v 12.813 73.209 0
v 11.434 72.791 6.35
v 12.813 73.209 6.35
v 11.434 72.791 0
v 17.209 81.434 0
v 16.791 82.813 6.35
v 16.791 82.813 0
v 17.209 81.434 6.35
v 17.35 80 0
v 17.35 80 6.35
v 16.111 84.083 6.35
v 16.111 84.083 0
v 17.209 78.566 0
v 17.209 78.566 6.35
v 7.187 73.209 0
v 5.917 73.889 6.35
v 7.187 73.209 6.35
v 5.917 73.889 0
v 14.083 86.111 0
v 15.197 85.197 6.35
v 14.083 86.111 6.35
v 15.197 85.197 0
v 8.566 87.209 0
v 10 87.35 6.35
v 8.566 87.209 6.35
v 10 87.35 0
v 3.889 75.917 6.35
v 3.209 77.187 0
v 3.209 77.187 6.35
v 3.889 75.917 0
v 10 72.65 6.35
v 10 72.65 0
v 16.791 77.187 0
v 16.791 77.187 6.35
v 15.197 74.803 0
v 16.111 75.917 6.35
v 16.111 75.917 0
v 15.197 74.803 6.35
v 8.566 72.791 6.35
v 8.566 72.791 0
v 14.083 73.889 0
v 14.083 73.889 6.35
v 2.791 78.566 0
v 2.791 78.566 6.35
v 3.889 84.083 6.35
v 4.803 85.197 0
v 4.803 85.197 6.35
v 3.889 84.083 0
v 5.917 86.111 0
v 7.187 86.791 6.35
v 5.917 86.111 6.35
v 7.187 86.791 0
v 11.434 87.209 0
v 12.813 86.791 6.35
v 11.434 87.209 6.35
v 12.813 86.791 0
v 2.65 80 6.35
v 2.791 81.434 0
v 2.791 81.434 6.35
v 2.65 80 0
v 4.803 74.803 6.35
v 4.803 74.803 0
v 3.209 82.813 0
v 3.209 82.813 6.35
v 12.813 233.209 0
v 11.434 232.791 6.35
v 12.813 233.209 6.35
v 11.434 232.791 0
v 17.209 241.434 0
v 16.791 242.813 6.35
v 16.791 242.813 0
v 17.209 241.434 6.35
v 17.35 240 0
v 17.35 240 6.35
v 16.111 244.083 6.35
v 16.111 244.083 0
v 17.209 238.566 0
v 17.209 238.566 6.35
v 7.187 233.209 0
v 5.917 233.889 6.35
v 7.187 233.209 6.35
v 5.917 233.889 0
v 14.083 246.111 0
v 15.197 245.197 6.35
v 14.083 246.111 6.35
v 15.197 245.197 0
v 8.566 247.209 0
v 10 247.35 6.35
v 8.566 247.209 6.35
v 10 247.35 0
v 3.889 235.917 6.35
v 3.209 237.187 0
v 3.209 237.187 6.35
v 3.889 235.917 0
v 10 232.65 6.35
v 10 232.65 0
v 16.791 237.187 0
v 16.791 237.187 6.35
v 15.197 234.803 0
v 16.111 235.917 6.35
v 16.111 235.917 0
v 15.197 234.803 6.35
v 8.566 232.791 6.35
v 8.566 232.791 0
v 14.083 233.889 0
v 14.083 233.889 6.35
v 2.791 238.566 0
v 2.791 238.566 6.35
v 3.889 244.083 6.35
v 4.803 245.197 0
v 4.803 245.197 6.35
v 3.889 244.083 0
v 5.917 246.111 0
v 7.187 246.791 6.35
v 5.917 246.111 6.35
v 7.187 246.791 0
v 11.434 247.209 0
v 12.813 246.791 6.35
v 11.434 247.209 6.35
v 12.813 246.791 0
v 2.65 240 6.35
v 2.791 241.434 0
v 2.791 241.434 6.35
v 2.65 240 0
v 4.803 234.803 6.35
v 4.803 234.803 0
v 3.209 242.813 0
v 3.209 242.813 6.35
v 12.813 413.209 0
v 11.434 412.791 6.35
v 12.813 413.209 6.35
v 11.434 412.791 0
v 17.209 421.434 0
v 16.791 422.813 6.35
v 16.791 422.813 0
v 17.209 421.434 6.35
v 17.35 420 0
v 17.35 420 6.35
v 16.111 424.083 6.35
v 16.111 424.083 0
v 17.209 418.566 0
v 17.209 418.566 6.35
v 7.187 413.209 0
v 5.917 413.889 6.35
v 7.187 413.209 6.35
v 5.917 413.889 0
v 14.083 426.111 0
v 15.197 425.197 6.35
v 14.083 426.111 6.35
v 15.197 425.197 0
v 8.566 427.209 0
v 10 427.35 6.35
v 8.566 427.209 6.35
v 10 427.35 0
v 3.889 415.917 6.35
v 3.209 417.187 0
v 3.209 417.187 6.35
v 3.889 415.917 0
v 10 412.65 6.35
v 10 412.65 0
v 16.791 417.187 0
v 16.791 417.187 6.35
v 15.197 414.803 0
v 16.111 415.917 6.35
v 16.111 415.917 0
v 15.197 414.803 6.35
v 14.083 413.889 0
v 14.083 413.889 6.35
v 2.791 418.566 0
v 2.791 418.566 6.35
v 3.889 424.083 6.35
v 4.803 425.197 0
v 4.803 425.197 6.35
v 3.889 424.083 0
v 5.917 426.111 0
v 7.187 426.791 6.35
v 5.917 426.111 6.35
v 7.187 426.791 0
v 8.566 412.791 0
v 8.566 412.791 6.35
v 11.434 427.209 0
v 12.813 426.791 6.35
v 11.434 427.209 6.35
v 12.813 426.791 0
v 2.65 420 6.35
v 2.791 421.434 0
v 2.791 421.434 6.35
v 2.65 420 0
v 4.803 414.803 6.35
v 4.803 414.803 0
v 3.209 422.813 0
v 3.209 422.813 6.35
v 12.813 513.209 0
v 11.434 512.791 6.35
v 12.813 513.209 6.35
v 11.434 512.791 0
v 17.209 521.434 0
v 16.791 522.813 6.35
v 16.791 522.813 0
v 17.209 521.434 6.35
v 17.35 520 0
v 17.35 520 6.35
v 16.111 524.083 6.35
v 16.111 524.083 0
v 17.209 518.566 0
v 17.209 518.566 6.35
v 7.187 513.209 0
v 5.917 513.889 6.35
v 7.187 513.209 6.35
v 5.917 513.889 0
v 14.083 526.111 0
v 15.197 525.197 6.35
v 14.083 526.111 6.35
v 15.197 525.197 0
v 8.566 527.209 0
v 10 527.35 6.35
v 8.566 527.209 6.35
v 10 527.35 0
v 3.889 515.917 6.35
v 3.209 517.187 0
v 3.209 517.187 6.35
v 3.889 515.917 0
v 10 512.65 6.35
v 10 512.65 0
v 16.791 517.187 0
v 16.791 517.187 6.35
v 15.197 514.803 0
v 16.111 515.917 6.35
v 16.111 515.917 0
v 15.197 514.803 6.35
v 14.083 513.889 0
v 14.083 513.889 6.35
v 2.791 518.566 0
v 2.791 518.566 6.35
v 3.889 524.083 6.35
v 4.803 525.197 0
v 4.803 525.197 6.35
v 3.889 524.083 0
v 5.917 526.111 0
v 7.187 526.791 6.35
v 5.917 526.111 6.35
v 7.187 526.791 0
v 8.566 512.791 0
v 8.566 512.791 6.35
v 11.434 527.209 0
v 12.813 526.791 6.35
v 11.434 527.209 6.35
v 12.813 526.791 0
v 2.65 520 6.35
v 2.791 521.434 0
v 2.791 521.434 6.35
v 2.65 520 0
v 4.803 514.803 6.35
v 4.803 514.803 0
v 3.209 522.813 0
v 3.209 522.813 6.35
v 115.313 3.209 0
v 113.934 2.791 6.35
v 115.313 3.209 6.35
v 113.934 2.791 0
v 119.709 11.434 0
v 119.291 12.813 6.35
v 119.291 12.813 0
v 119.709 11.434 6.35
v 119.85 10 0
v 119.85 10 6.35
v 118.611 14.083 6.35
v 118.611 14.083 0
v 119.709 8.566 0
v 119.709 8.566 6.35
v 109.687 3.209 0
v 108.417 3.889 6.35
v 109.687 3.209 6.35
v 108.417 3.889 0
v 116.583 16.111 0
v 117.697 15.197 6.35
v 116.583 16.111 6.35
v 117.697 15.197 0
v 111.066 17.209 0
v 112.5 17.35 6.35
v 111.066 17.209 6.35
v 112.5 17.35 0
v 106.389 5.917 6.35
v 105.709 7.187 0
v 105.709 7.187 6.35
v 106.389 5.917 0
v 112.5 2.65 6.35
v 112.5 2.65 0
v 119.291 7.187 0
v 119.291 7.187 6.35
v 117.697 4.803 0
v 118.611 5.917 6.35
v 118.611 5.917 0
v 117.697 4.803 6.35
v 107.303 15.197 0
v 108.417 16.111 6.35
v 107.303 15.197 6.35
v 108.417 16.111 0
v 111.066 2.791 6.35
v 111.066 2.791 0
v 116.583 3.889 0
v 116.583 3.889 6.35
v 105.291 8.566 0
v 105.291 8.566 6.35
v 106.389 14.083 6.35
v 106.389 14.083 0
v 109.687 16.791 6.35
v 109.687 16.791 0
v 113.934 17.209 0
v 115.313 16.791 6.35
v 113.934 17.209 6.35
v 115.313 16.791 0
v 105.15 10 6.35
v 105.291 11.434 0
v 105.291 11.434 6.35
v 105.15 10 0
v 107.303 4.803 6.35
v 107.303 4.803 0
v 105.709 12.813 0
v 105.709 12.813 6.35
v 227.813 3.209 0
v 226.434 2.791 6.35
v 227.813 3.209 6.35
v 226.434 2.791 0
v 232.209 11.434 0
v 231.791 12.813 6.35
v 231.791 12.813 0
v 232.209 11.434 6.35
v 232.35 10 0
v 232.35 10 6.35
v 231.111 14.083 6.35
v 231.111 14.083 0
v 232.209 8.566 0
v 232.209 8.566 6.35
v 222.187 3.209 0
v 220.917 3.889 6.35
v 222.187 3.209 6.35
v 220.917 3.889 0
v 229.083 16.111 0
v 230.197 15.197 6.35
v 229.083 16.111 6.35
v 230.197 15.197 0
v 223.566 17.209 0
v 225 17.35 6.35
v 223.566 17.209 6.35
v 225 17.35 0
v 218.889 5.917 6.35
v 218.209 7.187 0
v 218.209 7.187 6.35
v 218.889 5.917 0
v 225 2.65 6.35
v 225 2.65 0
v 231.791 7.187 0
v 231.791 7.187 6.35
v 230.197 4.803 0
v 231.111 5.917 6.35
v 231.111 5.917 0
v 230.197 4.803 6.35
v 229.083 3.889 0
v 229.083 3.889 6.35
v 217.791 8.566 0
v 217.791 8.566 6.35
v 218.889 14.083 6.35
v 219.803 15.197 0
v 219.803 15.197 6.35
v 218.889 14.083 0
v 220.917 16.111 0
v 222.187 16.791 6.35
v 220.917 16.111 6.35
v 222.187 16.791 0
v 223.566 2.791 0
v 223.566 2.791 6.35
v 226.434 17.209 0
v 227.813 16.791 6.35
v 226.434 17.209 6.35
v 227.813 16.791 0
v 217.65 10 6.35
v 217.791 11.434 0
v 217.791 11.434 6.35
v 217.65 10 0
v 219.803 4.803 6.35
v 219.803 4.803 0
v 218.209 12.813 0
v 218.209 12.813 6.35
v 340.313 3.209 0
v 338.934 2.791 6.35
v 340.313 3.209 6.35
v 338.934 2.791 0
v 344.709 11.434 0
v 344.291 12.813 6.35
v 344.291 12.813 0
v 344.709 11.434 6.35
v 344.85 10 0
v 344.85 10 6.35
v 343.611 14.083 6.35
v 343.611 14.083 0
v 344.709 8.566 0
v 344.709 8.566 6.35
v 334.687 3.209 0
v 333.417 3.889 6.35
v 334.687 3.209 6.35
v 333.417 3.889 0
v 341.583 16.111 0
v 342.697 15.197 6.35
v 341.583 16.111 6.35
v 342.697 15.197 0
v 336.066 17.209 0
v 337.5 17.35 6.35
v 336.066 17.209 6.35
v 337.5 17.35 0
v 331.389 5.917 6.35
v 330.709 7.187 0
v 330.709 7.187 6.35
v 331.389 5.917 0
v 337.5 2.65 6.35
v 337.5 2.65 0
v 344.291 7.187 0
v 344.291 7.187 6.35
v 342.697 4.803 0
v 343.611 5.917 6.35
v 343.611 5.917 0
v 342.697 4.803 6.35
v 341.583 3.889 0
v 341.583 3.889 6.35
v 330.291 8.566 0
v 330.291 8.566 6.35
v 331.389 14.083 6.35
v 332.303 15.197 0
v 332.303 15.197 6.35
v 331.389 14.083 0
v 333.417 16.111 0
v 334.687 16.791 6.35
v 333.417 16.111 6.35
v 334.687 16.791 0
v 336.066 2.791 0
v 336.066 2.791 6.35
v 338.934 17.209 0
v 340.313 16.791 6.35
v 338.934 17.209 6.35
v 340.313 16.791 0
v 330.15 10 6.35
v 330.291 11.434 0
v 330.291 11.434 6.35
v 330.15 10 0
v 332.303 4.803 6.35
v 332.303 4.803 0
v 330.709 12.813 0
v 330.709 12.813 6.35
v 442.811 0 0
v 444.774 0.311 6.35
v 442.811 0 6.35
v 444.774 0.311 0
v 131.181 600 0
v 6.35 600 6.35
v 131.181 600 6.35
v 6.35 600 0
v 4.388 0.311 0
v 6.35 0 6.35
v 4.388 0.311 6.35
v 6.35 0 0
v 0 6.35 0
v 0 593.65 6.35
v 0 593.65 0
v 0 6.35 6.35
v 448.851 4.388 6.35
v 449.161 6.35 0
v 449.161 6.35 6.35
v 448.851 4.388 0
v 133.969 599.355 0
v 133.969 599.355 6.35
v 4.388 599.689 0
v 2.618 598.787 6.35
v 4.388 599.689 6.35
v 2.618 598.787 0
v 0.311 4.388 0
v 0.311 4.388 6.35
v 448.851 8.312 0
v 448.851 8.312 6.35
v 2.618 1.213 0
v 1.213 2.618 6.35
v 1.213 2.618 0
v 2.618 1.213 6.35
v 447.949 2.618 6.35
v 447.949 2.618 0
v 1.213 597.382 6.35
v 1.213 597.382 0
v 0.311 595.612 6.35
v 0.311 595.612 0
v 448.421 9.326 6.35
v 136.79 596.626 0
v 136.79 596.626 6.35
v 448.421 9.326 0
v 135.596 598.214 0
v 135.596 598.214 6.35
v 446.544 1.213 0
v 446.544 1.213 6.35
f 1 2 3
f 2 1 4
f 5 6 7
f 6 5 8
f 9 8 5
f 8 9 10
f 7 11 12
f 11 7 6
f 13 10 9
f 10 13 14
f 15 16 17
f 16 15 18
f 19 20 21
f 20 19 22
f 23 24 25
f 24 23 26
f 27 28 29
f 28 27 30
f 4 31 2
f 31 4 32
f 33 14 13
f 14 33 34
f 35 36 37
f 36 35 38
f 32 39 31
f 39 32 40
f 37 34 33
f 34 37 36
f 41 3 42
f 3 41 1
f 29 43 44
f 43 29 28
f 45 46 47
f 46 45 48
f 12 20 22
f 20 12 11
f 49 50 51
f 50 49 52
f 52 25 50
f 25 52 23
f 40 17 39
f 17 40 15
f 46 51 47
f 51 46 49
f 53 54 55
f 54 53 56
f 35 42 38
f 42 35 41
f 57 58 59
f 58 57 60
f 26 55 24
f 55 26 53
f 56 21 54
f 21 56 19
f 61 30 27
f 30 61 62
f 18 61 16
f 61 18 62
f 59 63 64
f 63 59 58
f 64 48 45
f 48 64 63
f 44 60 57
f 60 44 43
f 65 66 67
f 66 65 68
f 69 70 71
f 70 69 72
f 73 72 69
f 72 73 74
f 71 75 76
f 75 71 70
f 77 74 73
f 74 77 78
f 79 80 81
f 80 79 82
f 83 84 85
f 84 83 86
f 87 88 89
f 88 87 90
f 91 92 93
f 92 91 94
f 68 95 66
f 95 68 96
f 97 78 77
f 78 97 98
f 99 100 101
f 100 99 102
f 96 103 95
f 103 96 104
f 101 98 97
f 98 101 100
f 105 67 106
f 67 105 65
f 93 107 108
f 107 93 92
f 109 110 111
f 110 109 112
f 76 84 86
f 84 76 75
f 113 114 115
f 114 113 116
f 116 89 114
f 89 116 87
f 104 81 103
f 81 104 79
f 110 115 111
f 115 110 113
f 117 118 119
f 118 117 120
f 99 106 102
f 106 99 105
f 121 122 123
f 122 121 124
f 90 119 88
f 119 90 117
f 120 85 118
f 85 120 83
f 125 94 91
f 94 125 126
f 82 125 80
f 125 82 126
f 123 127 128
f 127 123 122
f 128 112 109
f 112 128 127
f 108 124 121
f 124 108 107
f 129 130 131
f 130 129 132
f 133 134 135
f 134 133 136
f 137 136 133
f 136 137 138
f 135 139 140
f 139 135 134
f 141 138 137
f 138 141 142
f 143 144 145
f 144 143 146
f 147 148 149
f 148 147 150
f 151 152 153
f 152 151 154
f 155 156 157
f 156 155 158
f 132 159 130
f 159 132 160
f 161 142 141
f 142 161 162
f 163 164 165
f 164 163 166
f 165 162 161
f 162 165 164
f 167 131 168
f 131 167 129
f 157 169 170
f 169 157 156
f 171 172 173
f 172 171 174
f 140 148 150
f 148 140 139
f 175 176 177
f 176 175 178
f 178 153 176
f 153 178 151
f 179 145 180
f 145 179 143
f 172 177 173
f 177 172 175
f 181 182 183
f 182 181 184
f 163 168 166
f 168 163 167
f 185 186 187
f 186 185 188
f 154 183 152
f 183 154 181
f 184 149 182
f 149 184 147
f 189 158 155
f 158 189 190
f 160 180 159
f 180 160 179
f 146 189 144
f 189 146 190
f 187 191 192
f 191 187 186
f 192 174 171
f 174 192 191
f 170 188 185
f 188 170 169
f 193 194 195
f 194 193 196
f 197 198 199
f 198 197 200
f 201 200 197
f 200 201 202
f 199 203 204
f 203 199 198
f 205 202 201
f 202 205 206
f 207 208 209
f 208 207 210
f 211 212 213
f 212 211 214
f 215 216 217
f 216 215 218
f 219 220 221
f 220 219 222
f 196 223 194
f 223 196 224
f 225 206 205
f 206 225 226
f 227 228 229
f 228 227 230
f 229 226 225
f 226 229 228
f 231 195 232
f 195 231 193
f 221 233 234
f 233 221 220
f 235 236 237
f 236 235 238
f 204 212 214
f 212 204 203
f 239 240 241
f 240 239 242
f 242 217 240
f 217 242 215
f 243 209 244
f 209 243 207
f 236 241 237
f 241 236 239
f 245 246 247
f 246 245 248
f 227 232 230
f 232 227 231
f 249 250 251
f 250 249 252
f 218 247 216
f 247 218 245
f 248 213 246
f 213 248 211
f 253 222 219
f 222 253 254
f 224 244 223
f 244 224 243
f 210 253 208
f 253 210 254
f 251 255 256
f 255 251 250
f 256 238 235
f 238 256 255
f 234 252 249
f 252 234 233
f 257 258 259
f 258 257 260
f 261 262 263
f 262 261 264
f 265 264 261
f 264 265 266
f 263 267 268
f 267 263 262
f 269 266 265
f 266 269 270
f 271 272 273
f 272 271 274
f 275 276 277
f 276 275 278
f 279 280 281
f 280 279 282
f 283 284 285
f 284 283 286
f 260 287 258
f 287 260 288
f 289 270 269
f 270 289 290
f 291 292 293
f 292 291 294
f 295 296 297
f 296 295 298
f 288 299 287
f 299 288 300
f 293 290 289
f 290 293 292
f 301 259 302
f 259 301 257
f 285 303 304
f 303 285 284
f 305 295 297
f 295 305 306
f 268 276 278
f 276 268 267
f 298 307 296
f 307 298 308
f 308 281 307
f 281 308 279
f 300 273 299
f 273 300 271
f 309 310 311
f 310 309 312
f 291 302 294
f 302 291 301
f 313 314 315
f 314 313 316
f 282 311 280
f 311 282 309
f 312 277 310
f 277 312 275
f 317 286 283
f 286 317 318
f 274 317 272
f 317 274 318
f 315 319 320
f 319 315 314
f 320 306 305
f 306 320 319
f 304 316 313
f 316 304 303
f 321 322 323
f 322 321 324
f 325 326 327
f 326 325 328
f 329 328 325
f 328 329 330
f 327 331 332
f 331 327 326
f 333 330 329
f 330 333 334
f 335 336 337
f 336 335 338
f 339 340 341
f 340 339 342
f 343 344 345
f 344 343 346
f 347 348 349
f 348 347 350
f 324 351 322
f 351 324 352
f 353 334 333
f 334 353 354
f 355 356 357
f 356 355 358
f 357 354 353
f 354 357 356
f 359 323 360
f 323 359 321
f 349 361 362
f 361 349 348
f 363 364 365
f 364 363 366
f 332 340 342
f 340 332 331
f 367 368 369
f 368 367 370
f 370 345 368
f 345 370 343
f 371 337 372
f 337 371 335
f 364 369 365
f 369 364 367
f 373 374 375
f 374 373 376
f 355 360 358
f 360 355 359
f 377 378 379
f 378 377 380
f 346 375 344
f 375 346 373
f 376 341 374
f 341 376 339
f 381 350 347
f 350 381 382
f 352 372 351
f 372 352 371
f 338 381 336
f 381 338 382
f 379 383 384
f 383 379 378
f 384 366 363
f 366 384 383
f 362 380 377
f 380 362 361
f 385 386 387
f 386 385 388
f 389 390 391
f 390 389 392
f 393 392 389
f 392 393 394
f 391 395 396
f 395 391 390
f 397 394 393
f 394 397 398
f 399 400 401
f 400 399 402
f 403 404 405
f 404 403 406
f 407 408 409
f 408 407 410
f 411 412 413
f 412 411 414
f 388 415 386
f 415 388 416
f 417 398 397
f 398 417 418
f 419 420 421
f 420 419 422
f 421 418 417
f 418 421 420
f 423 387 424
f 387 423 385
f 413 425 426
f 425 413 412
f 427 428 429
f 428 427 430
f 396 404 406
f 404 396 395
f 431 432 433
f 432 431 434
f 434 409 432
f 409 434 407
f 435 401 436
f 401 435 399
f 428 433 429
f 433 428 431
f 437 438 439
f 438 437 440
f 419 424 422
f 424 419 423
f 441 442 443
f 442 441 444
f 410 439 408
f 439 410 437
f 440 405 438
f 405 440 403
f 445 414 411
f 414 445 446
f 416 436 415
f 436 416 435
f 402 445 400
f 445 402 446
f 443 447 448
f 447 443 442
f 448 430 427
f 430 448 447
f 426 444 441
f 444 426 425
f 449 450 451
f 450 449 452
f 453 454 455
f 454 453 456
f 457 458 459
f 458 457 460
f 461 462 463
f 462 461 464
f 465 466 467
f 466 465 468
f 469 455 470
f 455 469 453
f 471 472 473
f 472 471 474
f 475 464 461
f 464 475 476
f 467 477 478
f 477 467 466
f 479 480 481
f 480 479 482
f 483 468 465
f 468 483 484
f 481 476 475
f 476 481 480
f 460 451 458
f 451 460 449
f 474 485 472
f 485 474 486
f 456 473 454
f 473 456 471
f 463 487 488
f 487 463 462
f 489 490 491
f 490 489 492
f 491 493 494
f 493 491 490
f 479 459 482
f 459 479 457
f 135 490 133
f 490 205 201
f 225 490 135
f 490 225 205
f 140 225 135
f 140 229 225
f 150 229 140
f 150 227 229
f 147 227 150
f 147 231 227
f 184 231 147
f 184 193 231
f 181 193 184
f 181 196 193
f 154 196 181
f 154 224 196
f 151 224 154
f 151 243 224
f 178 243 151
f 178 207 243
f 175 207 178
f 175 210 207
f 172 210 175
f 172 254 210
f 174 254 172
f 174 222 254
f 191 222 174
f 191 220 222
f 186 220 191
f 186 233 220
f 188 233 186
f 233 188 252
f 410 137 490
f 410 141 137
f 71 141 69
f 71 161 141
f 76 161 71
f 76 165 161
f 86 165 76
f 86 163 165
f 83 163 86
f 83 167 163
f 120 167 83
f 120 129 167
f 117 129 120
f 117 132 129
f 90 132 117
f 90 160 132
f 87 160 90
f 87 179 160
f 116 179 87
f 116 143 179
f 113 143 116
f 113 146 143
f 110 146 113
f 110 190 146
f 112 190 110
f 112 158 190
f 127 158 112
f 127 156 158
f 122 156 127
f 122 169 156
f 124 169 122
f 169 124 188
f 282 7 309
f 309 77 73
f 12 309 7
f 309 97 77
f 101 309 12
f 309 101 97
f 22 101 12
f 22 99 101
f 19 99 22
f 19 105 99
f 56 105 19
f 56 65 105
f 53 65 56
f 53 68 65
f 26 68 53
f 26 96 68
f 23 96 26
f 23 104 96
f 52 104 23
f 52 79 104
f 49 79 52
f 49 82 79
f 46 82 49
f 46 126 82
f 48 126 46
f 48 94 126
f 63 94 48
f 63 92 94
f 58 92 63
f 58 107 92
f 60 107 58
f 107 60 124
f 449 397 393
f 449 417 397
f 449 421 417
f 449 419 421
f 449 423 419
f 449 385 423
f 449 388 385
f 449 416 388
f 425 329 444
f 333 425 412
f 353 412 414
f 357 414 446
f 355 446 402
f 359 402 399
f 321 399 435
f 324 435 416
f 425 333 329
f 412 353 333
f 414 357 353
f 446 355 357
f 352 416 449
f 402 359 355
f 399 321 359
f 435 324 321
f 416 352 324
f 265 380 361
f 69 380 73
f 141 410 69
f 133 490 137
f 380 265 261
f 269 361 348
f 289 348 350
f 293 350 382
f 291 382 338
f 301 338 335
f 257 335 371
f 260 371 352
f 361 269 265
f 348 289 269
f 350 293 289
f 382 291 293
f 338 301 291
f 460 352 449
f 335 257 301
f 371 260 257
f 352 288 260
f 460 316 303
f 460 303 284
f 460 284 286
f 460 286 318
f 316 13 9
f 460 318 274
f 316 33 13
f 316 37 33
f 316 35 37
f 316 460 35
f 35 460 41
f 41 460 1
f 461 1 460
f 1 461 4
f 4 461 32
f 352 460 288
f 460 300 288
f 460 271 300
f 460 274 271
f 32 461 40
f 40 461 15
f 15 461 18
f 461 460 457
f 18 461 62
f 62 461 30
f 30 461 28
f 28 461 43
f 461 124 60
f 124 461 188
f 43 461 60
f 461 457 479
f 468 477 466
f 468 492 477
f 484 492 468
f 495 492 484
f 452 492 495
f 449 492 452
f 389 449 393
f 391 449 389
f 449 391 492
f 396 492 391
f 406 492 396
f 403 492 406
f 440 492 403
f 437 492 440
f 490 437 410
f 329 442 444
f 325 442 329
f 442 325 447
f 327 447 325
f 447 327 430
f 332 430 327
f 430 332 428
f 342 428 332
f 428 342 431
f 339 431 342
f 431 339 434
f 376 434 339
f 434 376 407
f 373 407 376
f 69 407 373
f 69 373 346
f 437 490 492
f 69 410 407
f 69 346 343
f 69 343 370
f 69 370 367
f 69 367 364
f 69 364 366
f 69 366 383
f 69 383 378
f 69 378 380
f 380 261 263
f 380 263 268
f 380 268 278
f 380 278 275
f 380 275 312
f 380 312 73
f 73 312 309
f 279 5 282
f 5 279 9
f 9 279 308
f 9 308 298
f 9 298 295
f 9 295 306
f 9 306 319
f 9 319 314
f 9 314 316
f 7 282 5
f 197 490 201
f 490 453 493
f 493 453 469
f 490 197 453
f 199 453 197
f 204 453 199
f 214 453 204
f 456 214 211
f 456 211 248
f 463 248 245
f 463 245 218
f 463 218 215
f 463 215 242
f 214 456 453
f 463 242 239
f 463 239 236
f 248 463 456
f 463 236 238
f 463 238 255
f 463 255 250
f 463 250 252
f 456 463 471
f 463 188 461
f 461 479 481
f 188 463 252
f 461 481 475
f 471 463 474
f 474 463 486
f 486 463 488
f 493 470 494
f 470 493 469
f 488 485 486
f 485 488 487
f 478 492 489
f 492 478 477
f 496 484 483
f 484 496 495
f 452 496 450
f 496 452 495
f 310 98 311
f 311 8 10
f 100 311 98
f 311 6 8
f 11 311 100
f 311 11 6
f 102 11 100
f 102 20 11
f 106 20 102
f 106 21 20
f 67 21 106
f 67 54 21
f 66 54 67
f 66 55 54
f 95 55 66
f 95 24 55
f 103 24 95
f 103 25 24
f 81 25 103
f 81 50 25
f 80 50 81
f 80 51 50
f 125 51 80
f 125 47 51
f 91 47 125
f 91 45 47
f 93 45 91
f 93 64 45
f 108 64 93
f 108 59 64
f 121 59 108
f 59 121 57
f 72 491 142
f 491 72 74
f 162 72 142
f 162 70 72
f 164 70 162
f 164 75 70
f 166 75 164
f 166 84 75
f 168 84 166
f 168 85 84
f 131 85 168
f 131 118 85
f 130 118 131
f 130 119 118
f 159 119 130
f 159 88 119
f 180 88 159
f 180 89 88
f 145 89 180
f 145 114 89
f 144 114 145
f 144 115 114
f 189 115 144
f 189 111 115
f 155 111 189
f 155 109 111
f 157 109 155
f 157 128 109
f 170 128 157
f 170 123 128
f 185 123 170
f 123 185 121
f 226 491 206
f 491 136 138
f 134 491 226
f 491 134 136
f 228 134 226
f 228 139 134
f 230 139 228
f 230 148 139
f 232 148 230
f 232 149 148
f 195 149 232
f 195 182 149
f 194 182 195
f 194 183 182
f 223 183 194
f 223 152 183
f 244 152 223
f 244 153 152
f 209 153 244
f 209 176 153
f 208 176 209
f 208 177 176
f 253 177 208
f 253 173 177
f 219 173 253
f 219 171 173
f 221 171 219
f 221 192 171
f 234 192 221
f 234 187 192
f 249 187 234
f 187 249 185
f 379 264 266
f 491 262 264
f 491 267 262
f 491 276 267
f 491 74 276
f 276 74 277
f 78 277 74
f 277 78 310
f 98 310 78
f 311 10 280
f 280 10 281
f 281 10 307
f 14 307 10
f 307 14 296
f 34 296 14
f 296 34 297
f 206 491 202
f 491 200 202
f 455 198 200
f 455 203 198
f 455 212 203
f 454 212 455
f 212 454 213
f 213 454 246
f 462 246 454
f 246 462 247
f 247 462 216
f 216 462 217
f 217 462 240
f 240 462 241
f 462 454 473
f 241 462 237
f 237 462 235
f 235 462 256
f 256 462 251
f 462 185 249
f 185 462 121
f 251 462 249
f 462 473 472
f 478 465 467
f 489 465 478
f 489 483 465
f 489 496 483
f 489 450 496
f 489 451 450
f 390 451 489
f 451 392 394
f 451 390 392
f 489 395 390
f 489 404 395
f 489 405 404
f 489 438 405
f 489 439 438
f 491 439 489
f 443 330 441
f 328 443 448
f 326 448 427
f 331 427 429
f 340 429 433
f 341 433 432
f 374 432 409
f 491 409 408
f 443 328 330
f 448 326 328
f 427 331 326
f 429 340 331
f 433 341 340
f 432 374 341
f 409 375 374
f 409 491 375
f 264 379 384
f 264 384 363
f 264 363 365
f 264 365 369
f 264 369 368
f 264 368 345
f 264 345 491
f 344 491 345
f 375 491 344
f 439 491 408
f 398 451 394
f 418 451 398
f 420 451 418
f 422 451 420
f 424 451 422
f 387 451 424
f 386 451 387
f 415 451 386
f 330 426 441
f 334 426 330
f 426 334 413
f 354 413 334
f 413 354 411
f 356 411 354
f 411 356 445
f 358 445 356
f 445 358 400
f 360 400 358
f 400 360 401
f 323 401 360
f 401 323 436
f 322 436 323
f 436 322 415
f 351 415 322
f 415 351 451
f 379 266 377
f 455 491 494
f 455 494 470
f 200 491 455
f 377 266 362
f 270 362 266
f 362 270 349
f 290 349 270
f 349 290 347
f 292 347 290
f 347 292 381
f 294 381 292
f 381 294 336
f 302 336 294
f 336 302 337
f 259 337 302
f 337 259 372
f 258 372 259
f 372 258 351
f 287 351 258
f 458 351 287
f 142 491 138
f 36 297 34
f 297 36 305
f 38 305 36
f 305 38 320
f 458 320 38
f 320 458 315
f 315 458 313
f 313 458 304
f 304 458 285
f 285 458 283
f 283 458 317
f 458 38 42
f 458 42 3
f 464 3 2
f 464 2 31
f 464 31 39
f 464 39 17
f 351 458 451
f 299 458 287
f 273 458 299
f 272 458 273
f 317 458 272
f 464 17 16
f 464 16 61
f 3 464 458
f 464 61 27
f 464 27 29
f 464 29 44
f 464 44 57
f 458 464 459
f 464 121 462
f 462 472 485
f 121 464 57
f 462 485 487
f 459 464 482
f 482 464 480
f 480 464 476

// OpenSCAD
// bucket_side.scad
// Bucket side plate for LifeTrac v25
// CNC cut from 1/4" plate steel
// Trapezoidal shape

include <../lifetrac_v25_params.scad>

module bucket_side() {
    plate_thickness = PLATE_1_4_INCH;
    
    difference() {
        // Trapezoidal side profile
        linear_extrude(height=plate_thickness)
        offset(r=6.35) offset(r=-6.35)  // Rounded corners
        polygon([
            [0, 0],                           // Bottom front
            [BUCKET_HEIGHT, 0],               // Top front
            [BUCKET_HEIGHT, plate_thickness], // Top front edge
            [BUCKET_HEIGHT * 0.3, BUCKET_DEPTH], // Bottom back
            [0, BUCKET_DEPTH]                 // Bottom back front
        ]);
        
        // Bottom edge mounting holes
        for (y = [80, BUCKET_DEPTH*0.4, BUCKET_DEPTH*0.7, BUCKET_DEPTH-80]) {
            translate([10, y, plate_thickness/2])
            cylinder(d=BOLT_DIA_1_2 + 2, h=plate_thickness+4, center=true, $fn=32);
        }
        
        // Top/front edge mounting holes
        for (z = [BUCKET_HEIGHT*0.25, BUCKET_HEIGHT*0.5, BUCKET_HEIGHT*0.75]) {
            translate([z, 10, plate_thickness/2])
            cylinder(d=BOLT_DIA_1_2 + 2, h=plate_thickness+4, center=true, $fn=32);
        }
    }
}

// Render the part for preview/export
if ($preview || len(search("bucket_side.scad", parent_modules())) == 0) {
    bucket_side();
}
